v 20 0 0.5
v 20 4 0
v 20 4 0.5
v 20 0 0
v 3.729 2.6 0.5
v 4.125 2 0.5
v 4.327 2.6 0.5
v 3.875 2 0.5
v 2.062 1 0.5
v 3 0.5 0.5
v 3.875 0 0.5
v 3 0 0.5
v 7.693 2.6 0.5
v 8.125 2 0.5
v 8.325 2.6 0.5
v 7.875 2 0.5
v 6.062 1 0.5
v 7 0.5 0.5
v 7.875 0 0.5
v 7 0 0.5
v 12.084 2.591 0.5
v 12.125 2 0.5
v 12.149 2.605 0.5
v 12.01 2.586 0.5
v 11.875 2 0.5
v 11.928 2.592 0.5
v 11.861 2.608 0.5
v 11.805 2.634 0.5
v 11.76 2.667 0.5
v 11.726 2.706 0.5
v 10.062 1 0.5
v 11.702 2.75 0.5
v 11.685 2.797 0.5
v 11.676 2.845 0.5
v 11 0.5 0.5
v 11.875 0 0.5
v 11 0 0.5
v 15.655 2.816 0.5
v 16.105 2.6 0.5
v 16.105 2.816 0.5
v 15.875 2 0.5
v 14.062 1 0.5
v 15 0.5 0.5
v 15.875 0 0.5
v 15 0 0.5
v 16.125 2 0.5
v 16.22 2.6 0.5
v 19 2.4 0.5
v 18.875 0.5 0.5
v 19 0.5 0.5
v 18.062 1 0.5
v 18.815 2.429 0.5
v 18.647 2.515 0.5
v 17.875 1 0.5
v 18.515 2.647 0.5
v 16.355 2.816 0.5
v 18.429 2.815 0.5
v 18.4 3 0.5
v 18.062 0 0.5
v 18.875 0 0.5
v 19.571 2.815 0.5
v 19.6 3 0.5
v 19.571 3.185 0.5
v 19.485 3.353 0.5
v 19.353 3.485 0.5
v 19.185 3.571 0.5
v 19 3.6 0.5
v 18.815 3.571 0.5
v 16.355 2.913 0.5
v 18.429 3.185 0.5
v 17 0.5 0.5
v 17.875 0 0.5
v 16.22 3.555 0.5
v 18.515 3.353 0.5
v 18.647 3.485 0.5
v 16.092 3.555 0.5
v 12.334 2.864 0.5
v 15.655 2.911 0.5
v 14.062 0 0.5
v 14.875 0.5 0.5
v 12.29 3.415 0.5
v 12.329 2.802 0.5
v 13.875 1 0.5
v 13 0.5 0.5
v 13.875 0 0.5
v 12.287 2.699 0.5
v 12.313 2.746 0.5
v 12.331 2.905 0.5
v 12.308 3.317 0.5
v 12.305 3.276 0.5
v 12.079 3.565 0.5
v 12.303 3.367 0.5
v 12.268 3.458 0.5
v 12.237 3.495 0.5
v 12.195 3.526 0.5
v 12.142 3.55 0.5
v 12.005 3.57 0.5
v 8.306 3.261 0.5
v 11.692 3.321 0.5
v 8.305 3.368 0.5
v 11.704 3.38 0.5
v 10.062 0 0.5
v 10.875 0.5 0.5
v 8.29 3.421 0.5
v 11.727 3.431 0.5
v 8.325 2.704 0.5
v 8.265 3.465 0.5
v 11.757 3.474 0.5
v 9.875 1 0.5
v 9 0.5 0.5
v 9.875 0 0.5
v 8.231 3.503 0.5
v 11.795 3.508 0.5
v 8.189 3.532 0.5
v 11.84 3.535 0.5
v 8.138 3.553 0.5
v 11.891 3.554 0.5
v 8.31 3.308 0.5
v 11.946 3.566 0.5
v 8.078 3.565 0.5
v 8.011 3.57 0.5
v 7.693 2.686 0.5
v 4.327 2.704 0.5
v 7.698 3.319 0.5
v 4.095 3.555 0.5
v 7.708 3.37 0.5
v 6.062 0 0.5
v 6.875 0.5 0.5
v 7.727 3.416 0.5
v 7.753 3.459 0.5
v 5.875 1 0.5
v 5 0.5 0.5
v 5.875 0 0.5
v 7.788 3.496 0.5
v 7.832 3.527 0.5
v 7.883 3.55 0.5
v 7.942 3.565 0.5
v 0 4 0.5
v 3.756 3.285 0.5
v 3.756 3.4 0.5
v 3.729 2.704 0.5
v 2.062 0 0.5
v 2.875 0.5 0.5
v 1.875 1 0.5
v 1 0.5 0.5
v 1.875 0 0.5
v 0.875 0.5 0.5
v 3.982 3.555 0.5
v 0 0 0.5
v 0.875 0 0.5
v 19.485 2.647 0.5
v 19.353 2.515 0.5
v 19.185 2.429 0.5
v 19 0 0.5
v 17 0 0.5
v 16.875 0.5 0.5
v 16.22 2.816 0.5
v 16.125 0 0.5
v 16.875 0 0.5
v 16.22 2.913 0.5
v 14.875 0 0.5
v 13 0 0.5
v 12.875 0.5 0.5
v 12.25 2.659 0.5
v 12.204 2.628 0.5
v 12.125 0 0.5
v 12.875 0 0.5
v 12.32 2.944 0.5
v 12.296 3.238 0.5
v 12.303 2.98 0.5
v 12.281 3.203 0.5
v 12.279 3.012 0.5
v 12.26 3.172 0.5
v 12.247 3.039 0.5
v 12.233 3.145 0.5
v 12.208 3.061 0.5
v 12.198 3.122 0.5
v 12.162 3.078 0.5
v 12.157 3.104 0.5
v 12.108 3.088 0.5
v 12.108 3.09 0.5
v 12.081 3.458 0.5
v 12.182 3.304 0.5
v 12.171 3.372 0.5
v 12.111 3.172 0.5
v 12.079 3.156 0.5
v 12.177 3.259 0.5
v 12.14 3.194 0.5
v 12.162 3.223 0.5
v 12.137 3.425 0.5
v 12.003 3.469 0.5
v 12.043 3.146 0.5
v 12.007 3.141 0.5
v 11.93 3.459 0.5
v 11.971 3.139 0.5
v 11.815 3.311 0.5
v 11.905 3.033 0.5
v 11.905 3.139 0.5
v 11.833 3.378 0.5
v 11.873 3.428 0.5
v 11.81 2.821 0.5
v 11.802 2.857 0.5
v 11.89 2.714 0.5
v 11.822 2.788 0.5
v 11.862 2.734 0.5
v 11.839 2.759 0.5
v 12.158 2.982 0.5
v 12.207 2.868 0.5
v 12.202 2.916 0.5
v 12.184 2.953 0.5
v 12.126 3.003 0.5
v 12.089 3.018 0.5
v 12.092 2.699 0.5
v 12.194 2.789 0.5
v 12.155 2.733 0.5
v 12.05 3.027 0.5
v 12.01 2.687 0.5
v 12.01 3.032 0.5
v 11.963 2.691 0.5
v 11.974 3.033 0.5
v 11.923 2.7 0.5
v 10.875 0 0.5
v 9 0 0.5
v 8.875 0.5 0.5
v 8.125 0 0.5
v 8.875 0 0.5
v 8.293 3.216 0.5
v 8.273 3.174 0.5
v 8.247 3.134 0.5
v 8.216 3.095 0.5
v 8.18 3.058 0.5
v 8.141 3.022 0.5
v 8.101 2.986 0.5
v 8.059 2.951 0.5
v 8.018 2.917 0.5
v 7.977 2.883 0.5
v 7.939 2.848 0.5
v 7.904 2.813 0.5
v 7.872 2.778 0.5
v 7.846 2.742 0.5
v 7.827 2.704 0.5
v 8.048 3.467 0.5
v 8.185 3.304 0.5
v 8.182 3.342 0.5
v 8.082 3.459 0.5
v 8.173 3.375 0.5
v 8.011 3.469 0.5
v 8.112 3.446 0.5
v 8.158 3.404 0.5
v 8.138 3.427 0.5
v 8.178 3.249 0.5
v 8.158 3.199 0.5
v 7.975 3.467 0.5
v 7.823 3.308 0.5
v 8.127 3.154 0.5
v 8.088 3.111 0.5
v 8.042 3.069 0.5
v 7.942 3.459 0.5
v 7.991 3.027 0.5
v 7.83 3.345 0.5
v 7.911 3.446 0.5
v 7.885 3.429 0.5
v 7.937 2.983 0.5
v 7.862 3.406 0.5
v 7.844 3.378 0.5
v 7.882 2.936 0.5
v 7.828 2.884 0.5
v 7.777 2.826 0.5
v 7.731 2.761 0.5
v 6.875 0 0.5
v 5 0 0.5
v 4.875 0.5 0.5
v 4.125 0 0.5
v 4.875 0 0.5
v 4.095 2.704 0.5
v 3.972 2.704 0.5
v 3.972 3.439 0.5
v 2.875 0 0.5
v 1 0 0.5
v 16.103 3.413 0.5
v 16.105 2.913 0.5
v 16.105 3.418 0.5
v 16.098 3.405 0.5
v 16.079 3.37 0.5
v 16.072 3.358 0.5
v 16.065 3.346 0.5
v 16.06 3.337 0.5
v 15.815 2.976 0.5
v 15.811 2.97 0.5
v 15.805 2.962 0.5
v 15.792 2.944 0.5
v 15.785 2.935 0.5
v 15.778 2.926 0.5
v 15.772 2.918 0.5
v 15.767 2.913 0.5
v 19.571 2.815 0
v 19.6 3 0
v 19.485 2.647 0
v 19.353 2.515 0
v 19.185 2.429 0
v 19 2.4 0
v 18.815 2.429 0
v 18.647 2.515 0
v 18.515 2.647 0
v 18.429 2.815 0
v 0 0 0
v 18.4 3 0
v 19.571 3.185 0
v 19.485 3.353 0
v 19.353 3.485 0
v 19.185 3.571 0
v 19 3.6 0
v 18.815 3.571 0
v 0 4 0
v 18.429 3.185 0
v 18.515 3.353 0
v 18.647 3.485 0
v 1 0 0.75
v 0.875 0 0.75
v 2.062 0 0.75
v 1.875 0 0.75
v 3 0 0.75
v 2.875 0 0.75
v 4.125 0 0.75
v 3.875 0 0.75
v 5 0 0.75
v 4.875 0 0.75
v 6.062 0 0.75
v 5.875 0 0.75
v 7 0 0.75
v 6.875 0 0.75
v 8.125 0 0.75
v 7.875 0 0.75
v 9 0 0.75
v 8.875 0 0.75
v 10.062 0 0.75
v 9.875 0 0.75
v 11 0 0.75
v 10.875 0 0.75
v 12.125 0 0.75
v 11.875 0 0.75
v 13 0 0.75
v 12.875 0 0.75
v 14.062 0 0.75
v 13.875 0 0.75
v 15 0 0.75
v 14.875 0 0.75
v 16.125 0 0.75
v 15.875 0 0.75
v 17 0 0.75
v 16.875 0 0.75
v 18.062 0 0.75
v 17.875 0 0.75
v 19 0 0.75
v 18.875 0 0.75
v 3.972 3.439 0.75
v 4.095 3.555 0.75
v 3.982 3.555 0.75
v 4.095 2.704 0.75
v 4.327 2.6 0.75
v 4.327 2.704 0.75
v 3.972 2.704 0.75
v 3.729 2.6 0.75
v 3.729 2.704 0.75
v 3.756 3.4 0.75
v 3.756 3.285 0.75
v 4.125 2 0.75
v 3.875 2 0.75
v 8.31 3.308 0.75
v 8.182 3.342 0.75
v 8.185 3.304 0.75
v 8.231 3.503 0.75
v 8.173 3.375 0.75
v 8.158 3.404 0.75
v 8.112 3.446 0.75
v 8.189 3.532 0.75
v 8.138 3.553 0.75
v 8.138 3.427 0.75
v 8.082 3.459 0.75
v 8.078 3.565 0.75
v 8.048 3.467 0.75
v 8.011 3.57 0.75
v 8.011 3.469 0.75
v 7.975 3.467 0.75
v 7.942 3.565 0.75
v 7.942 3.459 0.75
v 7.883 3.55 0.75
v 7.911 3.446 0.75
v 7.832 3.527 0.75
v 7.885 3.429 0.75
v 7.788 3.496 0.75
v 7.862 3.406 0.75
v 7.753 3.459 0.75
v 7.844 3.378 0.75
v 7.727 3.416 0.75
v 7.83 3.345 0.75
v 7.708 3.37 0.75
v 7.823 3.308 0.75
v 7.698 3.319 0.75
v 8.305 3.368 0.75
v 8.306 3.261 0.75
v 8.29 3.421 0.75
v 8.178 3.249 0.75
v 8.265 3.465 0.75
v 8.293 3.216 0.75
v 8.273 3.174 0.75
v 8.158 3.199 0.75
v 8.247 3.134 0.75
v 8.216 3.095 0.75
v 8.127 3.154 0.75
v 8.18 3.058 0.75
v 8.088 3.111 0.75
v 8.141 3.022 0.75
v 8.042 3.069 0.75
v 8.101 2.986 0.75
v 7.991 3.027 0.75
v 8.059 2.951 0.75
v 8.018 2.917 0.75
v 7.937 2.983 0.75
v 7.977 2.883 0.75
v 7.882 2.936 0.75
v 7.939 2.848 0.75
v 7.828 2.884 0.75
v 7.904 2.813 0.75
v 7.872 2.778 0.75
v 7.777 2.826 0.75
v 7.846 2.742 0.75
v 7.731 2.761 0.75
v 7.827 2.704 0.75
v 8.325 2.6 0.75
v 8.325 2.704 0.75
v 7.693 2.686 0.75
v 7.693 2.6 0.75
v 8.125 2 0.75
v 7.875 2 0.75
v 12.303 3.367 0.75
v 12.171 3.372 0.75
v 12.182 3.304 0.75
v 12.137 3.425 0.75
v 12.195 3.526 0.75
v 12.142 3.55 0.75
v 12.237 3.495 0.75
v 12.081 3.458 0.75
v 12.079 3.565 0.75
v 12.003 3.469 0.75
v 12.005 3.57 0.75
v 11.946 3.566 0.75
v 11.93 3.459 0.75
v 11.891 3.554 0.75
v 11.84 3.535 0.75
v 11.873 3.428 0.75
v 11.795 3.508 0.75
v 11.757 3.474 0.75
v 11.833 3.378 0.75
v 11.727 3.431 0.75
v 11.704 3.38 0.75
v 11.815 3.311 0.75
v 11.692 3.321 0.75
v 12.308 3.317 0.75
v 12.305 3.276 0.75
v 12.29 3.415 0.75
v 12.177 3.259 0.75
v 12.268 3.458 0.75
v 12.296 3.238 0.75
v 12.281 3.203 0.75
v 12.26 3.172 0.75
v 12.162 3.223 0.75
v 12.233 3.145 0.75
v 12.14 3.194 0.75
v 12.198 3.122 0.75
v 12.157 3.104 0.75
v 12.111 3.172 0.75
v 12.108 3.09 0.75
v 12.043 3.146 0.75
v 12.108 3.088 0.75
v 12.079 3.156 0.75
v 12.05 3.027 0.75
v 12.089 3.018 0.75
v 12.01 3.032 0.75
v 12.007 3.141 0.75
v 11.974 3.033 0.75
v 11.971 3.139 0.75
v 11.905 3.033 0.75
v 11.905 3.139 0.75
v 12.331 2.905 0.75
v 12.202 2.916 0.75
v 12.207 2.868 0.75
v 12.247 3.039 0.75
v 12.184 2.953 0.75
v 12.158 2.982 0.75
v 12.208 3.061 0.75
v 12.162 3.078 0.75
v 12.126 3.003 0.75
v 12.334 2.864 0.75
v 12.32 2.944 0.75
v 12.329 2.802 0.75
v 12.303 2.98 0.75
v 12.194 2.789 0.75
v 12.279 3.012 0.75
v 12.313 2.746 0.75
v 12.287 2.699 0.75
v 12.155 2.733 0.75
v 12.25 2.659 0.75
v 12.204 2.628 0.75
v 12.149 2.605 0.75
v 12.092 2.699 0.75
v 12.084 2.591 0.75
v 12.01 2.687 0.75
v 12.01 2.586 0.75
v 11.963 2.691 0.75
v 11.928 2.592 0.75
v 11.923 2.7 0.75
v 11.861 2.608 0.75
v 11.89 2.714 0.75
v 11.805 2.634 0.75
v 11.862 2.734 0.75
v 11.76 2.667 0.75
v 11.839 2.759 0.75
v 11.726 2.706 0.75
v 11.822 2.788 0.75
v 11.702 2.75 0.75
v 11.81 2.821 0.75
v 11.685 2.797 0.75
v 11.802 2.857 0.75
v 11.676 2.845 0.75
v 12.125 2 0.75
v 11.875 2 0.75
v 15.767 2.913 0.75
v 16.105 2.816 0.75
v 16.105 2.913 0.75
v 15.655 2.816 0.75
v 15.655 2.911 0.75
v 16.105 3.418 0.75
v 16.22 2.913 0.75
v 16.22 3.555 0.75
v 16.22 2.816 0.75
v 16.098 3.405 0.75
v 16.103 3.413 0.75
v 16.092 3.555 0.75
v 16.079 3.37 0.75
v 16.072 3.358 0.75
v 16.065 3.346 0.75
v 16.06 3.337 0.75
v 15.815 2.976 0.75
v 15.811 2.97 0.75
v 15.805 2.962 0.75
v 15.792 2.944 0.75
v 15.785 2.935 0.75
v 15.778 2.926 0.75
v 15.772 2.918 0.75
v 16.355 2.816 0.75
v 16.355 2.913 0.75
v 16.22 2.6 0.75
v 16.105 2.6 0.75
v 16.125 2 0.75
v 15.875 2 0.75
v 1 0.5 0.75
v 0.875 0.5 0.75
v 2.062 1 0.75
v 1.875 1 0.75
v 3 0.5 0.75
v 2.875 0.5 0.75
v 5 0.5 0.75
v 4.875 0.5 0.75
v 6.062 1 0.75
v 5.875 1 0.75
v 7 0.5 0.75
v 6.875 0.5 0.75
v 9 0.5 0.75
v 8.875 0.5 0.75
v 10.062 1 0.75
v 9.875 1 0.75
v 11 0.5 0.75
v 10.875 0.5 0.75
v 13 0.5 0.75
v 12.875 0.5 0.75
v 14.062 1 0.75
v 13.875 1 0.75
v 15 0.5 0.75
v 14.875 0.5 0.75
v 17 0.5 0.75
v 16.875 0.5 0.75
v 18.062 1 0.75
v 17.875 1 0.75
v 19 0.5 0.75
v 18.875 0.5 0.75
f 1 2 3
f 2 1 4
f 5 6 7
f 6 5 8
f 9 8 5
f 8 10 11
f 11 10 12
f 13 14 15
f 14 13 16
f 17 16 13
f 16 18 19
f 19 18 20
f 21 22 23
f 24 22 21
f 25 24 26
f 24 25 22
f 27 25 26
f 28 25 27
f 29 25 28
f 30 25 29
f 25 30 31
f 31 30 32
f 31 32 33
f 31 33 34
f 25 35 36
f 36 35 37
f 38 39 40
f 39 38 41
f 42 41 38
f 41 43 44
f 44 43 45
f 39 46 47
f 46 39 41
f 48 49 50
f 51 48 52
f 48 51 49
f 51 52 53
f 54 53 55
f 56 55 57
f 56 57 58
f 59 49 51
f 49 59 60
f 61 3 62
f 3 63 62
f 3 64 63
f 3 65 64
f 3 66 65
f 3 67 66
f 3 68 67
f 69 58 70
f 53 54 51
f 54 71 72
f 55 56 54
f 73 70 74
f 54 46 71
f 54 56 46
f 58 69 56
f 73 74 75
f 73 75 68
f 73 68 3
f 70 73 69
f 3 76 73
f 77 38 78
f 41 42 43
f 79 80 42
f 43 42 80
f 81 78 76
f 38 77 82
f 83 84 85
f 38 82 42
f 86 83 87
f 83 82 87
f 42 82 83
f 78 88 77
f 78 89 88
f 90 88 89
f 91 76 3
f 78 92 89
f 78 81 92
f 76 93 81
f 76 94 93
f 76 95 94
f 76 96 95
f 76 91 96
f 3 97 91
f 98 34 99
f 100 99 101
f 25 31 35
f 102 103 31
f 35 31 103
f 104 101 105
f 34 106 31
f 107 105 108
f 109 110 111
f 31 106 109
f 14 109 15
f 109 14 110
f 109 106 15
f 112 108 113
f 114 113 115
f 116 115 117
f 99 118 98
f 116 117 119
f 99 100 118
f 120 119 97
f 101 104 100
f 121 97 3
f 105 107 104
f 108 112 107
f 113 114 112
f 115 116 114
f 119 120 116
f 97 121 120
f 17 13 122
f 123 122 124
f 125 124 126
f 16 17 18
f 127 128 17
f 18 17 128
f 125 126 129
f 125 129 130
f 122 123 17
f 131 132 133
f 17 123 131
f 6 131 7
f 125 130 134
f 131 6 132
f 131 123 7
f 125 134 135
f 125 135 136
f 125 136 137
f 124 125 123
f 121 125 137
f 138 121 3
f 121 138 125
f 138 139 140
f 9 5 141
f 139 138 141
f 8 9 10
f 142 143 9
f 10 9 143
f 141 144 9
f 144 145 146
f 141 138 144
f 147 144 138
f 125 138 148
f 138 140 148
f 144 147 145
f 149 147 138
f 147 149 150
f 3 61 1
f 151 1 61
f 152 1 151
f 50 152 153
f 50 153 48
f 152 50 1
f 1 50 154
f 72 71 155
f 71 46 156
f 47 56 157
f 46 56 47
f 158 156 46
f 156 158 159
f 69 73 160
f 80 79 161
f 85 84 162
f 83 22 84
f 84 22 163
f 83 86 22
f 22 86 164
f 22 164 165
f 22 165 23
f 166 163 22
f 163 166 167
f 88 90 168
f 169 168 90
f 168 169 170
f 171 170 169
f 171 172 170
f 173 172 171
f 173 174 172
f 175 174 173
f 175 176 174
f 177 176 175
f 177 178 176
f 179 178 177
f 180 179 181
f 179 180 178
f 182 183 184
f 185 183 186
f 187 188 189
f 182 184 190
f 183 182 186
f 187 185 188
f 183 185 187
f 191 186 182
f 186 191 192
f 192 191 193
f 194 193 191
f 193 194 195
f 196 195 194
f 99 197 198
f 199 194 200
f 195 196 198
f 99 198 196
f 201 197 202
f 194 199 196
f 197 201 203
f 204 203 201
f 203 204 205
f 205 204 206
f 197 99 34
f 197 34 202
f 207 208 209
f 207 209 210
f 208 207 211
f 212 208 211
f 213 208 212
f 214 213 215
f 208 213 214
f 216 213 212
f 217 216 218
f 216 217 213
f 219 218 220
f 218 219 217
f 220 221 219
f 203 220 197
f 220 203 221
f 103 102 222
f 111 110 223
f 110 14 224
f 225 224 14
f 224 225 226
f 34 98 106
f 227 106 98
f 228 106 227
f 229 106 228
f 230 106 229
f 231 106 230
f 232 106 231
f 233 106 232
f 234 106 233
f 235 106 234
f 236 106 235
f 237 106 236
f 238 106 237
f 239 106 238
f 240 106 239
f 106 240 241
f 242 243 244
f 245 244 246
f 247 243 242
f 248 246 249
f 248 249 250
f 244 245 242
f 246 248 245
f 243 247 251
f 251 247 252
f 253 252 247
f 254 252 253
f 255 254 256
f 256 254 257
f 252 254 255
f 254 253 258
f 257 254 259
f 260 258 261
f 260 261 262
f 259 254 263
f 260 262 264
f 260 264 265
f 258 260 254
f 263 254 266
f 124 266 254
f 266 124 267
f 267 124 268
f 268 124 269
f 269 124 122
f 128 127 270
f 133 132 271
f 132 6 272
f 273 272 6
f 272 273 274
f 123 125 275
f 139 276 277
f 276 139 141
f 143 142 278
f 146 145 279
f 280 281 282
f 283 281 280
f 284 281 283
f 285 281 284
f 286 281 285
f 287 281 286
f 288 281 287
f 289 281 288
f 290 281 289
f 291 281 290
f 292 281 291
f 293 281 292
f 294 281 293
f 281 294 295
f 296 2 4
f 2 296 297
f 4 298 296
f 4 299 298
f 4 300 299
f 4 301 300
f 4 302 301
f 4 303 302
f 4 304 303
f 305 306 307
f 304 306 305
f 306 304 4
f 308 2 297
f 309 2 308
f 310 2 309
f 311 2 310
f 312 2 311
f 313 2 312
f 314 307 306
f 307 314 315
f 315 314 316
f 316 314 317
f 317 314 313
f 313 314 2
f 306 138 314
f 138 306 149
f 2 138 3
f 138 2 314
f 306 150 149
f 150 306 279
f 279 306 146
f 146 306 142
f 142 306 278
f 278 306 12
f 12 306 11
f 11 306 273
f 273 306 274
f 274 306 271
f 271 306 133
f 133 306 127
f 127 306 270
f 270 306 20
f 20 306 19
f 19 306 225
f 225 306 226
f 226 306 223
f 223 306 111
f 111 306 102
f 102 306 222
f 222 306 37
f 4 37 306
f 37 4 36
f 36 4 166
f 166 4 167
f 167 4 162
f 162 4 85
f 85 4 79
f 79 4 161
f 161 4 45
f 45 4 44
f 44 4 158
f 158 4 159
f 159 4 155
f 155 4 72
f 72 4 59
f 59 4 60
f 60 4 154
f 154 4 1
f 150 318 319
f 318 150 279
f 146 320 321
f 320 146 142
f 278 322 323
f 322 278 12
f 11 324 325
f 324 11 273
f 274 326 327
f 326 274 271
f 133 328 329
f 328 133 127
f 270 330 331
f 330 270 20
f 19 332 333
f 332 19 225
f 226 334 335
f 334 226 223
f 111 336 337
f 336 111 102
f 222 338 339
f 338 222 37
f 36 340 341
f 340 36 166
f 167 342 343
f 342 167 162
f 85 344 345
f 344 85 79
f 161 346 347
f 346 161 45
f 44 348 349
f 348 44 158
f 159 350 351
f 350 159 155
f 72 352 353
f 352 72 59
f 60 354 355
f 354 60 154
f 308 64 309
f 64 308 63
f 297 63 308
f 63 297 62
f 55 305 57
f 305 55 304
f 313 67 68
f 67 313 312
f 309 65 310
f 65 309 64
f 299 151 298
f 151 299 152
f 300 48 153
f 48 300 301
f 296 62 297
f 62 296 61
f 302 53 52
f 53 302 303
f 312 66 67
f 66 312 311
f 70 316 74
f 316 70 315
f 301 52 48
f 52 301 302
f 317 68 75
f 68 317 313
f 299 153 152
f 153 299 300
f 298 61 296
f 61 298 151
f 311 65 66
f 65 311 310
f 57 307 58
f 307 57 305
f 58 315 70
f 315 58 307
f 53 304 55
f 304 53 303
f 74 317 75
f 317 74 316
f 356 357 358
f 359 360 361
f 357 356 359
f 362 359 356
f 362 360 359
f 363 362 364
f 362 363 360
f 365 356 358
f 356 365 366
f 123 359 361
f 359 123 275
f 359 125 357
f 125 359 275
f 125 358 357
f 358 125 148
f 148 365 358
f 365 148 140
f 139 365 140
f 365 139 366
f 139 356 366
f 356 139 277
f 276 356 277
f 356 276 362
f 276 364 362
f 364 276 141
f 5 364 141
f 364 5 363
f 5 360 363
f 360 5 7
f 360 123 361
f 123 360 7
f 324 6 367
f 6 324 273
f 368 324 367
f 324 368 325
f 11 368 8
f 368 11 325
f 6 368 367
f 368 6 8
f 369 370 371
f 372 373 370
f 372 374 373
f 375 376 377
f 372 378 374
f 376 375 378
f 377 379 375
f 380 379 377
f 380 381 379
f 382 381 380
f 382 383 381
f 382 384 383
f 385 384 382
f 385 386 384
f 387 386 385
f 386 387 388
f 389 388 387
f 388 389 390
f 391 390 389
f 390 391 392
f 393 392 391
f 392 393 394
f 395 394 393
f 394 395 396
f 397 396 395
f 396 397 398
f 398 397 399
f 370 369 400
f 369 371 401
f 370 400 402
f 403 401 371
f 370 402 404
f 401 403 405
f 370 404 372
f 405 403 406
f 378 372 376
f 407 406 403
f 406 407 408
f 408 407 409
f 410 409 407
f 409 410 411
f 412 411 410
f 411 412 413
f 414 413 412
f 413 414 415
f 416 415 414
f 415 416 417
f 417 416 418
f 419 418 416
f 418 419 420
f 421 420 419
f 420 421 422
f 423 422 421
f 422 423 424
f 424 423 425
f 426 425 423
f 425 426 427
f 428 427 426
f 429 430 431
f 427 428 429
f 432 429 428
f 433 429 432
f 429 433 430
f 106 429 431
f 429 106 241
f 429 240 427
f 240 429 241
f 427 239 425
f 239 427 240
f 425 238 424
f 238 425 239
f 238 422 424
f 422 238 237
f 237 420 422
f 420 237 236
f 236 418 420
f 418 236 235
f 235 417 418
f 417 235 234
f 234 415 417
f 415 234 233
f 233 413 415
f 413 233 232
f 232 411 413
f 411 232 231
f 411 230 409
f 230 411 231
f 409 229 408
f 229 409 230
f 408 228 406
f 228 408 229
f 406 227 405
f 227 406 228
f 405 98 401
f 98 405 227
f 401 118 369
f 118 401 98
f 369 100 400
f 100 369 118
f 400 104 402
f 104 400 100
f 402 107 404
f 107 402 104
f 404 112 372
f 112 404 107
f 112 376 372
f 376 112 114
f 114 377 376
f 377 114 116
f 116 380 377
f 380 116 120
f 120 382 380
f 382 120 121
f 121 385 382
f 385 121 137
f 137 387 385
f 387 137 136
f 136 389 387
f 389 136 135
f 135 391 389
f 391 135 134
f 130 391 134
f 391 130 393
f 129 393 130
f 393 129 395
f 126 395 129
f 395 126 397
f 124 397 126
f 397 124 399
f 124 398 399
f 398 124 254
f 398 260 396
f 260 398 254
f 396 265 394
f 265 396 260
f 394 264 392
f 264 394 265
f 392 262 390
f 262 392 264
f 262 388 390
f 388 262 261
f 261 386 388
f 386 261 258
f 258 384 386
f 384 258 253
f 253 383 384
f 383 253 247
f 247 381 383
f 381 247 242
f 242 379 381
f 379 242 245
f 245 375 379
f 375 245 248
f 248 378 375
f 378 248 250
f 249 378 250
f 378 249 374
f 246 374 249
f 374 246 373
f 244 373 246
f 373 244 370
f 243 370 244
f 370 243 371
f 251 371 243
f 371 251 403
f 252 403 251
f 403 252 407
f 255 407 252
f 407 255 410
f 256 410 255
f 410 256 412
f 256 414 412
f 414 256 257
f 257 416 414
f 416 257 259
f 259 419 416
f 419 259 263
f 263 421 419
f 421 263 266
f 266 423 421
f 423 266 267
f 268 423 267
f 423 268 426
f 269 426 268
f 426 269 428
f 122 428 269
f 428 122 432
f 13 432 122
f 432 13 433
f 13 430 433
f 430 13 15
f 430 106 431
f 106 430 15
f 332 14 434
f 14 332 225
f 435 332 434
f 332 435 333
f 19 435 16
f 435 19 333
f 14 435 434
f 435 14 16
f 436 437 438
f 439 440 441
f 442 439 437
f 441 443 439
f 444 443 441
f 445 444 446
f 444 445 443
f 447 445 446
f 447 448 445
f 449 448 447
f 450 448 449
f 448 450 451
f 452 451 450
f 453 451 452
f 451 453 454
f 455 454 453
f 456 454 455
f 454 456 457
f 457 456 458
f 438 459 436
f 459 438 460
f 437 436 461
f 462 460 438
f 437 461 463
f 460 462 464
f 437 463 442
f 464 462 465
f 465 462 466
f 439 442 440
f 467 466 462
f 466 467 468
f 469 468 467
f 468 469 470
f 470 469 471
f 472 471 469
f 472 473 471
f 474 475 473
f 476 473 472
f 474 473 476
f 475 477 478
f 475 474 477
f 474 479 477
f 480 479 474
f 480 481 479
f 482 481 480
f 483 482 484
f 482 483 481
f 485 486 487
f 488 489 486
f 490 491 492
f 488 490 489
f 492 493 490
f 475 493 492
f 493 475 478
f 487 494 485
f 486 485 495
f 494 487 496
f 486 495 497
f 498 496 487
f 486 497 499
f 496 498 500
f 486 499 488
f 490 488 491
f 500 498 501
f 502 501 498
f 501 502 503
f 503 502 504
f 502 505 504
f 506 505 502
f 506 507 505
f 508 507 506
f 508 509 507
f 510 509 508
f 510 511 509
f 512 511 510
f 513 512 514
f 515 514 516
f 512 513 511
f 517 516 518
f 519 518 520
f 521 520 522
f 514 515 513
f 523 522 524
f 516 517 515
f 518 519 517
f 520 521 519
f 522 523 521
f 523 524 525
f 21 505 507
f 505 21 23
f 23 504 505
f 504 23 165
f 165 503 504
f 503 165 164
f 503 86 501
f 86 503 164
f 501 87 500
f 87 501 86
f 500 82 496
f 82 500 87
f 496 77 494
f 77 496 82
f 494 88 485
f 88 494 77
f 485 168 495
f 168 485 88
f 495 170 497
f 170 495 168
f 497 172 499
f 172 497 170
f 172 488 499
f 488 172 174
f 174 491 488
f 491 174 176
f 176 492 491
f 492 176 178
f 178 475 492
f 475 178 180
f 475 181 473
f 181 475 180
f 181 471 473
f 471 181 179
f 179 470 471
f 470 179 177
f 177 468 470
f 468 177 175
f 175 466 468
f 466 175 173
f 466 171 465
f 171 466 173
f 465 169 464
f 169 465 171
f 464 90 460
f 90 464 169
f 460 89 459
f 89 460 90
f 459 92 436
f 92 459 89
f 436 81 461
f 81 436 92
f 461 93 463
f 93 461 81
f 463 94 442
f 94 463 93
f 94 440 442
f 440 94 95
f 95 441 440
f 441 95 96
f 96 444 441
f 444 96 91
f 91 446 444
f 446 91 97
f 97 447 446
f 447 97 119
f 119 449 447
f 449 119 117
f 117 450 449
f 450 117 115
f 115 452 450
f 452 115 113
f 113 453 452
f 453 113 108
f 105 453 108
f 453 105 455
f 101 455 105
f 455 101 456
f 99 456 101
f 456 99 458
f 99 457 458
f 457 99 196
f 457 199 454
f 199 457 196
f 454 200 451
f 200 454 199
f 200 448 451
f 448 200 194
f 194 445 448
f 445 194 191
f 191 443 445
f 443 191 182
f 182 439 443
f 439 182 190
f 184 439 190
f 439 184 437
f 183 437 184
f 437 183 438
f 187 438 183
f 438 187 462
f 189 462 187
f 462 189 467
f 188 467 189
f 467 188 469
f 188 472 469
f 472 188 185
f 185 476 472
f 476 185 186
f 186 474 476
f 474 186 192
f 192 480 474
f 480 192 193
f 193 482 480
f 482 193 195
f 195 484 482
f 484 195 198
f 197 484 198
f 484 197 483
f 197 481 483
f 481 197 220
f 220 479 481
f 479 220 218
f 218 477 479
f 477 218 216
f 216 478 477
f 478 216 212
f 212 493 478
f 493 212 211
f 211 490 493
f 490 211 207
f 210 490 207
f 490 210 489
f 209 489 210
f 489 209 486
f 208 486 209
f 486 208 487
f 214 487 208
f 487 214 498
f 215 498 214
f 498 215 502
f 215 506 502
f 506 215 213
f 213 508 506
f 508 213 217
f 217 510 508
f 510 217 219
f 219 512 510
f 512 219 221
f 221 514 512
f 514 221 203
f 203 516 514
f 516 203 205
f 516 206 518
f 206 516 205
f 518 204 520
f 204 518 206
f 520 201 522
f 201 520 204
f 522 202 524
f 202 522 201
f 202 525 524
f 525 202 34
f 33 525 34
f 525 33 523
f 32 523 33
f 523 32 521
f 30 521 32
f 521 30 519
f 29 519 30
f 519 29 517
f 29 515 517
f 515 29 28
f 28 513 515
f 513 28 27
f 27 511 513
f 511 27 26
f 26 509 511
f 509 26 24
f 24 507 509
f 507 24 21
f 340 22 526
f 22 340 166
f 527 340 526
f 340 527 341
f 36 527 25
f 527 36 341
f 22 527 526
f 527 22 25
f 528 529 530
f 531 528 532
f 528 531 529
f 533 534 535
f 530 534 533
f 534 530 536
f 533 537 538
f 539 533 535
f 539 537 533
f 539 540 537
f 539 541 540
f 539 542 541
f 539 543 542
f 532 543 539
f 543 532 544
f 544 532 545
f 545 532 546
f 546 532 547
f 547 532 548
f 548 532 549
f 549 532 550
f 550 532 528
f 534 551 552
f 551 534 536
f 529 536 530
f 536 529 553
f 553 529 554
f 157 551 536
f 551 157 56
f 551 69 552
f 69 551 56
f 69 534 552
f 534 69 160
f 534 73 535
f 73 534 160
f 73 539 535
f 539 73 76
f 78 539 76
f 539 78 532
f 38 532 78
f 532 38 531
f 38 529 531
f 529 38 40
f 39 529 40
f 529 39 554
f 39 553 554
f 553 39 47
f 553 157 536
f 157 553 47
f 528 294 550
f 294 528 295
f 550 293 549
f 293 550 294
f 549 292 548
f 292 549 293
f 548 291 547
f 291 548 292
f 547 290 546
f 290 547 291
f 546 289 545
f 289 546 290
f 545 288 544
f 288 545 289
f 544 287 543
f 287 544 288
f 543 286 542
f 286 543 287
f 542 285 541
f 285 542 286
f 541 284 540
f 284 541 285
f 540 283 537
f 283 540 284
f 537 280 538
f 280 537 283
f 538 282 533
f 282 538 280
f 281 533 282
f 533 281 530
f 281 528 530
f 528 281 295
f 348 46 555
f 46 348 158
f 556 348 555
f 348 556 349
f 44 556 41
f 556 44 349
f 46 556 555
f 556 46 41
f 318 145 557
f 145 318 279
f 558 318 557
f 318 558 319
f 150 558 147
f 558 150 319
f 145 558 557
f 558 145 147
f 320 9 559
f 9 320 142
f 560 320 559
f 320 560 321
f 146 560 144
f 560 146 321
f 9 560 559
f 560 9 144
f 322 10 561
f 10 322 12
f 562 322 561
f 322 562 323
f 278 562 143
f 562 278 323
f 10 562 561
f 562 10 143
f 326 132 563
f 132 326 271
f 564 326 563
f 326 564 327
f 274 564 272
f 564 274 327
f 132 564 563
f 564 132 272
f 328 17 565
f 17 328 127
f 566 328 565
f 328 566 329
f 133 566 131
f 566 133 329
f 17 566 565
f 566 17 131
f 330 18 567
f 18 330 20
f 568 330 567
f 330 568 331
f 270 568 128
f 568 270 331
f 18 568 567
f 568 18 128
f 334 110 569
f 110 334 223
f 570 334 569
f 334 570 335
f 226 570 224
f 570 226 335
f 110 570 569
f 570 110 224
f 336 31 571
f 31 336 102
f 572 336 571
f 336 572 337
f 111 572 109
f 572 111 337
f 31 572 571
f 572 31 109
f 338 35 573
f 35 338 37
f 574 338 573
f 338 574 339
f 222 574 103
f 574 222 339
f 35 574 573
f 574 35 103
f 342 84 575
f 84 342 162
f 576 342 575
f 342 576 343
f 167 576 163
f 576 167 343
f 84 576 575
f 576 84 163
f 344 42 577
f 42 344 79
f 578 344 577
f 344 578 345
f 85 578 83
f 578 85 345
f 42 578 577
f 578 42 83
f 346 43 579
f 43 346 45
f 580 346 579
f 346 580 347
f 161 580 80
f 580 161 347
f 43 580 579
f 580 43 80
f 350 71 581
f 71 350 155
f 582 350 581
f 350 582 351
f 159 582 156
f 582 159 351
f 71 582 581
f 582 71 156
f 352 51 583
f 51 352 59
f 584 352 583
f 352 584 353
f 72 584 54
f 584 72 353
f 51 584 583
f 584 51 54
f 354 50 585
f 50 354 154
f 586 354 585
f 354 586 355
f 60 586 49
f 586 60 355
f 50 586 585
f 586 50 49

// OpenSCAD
ruler(5);

module ruler(inches) {
  gap_size = 1; // 1 unit per quarter inch
  total_marks = 4 * inches; // inch, half-inch, quarter-inch

  width = gap_size * total_marks;
  length = 4 * gap_size;
  height = 0.5 * gap_size;

  mark_width = 0.25 * gap_size;
  mark_height = 1.5 * height;

  // main ruler body
  difference() {
    cube([width, length, height]);
    translate([width-gap_size, length-gap_size, -0.5])
      cylinder(h=height+1, r=0.15*length, $fn=20);
  }

  // tick marks
  for(t = [1:1:total_marks-1]) {
    mark_x = gap_size * t - 0.5 * mark_width;

    if (t%4 == 0) { // inch marks and number labels
      translate([gap_size * t, 0.65 * length, 0])
        linear_extrude(mark_height)
          text(str(t/4), size=gap_size, halign="center");
      translate([mark_x, 0, 0])
        cube([mark_width, 0.5 * length, mark_height]);
    }
    else if (t%2 == 0) { // half-inch marks
      translate([mark_x, 0, 0])
        cube([0.75 * mark_width, 0.25 * length, mark_height]);
    }
    else { // quarter-inch marks
      translate([mark_x, 0, 0])
        cube([0.5 * mark_width, 0.125 * length, mark_height]);
    }
  }
}
